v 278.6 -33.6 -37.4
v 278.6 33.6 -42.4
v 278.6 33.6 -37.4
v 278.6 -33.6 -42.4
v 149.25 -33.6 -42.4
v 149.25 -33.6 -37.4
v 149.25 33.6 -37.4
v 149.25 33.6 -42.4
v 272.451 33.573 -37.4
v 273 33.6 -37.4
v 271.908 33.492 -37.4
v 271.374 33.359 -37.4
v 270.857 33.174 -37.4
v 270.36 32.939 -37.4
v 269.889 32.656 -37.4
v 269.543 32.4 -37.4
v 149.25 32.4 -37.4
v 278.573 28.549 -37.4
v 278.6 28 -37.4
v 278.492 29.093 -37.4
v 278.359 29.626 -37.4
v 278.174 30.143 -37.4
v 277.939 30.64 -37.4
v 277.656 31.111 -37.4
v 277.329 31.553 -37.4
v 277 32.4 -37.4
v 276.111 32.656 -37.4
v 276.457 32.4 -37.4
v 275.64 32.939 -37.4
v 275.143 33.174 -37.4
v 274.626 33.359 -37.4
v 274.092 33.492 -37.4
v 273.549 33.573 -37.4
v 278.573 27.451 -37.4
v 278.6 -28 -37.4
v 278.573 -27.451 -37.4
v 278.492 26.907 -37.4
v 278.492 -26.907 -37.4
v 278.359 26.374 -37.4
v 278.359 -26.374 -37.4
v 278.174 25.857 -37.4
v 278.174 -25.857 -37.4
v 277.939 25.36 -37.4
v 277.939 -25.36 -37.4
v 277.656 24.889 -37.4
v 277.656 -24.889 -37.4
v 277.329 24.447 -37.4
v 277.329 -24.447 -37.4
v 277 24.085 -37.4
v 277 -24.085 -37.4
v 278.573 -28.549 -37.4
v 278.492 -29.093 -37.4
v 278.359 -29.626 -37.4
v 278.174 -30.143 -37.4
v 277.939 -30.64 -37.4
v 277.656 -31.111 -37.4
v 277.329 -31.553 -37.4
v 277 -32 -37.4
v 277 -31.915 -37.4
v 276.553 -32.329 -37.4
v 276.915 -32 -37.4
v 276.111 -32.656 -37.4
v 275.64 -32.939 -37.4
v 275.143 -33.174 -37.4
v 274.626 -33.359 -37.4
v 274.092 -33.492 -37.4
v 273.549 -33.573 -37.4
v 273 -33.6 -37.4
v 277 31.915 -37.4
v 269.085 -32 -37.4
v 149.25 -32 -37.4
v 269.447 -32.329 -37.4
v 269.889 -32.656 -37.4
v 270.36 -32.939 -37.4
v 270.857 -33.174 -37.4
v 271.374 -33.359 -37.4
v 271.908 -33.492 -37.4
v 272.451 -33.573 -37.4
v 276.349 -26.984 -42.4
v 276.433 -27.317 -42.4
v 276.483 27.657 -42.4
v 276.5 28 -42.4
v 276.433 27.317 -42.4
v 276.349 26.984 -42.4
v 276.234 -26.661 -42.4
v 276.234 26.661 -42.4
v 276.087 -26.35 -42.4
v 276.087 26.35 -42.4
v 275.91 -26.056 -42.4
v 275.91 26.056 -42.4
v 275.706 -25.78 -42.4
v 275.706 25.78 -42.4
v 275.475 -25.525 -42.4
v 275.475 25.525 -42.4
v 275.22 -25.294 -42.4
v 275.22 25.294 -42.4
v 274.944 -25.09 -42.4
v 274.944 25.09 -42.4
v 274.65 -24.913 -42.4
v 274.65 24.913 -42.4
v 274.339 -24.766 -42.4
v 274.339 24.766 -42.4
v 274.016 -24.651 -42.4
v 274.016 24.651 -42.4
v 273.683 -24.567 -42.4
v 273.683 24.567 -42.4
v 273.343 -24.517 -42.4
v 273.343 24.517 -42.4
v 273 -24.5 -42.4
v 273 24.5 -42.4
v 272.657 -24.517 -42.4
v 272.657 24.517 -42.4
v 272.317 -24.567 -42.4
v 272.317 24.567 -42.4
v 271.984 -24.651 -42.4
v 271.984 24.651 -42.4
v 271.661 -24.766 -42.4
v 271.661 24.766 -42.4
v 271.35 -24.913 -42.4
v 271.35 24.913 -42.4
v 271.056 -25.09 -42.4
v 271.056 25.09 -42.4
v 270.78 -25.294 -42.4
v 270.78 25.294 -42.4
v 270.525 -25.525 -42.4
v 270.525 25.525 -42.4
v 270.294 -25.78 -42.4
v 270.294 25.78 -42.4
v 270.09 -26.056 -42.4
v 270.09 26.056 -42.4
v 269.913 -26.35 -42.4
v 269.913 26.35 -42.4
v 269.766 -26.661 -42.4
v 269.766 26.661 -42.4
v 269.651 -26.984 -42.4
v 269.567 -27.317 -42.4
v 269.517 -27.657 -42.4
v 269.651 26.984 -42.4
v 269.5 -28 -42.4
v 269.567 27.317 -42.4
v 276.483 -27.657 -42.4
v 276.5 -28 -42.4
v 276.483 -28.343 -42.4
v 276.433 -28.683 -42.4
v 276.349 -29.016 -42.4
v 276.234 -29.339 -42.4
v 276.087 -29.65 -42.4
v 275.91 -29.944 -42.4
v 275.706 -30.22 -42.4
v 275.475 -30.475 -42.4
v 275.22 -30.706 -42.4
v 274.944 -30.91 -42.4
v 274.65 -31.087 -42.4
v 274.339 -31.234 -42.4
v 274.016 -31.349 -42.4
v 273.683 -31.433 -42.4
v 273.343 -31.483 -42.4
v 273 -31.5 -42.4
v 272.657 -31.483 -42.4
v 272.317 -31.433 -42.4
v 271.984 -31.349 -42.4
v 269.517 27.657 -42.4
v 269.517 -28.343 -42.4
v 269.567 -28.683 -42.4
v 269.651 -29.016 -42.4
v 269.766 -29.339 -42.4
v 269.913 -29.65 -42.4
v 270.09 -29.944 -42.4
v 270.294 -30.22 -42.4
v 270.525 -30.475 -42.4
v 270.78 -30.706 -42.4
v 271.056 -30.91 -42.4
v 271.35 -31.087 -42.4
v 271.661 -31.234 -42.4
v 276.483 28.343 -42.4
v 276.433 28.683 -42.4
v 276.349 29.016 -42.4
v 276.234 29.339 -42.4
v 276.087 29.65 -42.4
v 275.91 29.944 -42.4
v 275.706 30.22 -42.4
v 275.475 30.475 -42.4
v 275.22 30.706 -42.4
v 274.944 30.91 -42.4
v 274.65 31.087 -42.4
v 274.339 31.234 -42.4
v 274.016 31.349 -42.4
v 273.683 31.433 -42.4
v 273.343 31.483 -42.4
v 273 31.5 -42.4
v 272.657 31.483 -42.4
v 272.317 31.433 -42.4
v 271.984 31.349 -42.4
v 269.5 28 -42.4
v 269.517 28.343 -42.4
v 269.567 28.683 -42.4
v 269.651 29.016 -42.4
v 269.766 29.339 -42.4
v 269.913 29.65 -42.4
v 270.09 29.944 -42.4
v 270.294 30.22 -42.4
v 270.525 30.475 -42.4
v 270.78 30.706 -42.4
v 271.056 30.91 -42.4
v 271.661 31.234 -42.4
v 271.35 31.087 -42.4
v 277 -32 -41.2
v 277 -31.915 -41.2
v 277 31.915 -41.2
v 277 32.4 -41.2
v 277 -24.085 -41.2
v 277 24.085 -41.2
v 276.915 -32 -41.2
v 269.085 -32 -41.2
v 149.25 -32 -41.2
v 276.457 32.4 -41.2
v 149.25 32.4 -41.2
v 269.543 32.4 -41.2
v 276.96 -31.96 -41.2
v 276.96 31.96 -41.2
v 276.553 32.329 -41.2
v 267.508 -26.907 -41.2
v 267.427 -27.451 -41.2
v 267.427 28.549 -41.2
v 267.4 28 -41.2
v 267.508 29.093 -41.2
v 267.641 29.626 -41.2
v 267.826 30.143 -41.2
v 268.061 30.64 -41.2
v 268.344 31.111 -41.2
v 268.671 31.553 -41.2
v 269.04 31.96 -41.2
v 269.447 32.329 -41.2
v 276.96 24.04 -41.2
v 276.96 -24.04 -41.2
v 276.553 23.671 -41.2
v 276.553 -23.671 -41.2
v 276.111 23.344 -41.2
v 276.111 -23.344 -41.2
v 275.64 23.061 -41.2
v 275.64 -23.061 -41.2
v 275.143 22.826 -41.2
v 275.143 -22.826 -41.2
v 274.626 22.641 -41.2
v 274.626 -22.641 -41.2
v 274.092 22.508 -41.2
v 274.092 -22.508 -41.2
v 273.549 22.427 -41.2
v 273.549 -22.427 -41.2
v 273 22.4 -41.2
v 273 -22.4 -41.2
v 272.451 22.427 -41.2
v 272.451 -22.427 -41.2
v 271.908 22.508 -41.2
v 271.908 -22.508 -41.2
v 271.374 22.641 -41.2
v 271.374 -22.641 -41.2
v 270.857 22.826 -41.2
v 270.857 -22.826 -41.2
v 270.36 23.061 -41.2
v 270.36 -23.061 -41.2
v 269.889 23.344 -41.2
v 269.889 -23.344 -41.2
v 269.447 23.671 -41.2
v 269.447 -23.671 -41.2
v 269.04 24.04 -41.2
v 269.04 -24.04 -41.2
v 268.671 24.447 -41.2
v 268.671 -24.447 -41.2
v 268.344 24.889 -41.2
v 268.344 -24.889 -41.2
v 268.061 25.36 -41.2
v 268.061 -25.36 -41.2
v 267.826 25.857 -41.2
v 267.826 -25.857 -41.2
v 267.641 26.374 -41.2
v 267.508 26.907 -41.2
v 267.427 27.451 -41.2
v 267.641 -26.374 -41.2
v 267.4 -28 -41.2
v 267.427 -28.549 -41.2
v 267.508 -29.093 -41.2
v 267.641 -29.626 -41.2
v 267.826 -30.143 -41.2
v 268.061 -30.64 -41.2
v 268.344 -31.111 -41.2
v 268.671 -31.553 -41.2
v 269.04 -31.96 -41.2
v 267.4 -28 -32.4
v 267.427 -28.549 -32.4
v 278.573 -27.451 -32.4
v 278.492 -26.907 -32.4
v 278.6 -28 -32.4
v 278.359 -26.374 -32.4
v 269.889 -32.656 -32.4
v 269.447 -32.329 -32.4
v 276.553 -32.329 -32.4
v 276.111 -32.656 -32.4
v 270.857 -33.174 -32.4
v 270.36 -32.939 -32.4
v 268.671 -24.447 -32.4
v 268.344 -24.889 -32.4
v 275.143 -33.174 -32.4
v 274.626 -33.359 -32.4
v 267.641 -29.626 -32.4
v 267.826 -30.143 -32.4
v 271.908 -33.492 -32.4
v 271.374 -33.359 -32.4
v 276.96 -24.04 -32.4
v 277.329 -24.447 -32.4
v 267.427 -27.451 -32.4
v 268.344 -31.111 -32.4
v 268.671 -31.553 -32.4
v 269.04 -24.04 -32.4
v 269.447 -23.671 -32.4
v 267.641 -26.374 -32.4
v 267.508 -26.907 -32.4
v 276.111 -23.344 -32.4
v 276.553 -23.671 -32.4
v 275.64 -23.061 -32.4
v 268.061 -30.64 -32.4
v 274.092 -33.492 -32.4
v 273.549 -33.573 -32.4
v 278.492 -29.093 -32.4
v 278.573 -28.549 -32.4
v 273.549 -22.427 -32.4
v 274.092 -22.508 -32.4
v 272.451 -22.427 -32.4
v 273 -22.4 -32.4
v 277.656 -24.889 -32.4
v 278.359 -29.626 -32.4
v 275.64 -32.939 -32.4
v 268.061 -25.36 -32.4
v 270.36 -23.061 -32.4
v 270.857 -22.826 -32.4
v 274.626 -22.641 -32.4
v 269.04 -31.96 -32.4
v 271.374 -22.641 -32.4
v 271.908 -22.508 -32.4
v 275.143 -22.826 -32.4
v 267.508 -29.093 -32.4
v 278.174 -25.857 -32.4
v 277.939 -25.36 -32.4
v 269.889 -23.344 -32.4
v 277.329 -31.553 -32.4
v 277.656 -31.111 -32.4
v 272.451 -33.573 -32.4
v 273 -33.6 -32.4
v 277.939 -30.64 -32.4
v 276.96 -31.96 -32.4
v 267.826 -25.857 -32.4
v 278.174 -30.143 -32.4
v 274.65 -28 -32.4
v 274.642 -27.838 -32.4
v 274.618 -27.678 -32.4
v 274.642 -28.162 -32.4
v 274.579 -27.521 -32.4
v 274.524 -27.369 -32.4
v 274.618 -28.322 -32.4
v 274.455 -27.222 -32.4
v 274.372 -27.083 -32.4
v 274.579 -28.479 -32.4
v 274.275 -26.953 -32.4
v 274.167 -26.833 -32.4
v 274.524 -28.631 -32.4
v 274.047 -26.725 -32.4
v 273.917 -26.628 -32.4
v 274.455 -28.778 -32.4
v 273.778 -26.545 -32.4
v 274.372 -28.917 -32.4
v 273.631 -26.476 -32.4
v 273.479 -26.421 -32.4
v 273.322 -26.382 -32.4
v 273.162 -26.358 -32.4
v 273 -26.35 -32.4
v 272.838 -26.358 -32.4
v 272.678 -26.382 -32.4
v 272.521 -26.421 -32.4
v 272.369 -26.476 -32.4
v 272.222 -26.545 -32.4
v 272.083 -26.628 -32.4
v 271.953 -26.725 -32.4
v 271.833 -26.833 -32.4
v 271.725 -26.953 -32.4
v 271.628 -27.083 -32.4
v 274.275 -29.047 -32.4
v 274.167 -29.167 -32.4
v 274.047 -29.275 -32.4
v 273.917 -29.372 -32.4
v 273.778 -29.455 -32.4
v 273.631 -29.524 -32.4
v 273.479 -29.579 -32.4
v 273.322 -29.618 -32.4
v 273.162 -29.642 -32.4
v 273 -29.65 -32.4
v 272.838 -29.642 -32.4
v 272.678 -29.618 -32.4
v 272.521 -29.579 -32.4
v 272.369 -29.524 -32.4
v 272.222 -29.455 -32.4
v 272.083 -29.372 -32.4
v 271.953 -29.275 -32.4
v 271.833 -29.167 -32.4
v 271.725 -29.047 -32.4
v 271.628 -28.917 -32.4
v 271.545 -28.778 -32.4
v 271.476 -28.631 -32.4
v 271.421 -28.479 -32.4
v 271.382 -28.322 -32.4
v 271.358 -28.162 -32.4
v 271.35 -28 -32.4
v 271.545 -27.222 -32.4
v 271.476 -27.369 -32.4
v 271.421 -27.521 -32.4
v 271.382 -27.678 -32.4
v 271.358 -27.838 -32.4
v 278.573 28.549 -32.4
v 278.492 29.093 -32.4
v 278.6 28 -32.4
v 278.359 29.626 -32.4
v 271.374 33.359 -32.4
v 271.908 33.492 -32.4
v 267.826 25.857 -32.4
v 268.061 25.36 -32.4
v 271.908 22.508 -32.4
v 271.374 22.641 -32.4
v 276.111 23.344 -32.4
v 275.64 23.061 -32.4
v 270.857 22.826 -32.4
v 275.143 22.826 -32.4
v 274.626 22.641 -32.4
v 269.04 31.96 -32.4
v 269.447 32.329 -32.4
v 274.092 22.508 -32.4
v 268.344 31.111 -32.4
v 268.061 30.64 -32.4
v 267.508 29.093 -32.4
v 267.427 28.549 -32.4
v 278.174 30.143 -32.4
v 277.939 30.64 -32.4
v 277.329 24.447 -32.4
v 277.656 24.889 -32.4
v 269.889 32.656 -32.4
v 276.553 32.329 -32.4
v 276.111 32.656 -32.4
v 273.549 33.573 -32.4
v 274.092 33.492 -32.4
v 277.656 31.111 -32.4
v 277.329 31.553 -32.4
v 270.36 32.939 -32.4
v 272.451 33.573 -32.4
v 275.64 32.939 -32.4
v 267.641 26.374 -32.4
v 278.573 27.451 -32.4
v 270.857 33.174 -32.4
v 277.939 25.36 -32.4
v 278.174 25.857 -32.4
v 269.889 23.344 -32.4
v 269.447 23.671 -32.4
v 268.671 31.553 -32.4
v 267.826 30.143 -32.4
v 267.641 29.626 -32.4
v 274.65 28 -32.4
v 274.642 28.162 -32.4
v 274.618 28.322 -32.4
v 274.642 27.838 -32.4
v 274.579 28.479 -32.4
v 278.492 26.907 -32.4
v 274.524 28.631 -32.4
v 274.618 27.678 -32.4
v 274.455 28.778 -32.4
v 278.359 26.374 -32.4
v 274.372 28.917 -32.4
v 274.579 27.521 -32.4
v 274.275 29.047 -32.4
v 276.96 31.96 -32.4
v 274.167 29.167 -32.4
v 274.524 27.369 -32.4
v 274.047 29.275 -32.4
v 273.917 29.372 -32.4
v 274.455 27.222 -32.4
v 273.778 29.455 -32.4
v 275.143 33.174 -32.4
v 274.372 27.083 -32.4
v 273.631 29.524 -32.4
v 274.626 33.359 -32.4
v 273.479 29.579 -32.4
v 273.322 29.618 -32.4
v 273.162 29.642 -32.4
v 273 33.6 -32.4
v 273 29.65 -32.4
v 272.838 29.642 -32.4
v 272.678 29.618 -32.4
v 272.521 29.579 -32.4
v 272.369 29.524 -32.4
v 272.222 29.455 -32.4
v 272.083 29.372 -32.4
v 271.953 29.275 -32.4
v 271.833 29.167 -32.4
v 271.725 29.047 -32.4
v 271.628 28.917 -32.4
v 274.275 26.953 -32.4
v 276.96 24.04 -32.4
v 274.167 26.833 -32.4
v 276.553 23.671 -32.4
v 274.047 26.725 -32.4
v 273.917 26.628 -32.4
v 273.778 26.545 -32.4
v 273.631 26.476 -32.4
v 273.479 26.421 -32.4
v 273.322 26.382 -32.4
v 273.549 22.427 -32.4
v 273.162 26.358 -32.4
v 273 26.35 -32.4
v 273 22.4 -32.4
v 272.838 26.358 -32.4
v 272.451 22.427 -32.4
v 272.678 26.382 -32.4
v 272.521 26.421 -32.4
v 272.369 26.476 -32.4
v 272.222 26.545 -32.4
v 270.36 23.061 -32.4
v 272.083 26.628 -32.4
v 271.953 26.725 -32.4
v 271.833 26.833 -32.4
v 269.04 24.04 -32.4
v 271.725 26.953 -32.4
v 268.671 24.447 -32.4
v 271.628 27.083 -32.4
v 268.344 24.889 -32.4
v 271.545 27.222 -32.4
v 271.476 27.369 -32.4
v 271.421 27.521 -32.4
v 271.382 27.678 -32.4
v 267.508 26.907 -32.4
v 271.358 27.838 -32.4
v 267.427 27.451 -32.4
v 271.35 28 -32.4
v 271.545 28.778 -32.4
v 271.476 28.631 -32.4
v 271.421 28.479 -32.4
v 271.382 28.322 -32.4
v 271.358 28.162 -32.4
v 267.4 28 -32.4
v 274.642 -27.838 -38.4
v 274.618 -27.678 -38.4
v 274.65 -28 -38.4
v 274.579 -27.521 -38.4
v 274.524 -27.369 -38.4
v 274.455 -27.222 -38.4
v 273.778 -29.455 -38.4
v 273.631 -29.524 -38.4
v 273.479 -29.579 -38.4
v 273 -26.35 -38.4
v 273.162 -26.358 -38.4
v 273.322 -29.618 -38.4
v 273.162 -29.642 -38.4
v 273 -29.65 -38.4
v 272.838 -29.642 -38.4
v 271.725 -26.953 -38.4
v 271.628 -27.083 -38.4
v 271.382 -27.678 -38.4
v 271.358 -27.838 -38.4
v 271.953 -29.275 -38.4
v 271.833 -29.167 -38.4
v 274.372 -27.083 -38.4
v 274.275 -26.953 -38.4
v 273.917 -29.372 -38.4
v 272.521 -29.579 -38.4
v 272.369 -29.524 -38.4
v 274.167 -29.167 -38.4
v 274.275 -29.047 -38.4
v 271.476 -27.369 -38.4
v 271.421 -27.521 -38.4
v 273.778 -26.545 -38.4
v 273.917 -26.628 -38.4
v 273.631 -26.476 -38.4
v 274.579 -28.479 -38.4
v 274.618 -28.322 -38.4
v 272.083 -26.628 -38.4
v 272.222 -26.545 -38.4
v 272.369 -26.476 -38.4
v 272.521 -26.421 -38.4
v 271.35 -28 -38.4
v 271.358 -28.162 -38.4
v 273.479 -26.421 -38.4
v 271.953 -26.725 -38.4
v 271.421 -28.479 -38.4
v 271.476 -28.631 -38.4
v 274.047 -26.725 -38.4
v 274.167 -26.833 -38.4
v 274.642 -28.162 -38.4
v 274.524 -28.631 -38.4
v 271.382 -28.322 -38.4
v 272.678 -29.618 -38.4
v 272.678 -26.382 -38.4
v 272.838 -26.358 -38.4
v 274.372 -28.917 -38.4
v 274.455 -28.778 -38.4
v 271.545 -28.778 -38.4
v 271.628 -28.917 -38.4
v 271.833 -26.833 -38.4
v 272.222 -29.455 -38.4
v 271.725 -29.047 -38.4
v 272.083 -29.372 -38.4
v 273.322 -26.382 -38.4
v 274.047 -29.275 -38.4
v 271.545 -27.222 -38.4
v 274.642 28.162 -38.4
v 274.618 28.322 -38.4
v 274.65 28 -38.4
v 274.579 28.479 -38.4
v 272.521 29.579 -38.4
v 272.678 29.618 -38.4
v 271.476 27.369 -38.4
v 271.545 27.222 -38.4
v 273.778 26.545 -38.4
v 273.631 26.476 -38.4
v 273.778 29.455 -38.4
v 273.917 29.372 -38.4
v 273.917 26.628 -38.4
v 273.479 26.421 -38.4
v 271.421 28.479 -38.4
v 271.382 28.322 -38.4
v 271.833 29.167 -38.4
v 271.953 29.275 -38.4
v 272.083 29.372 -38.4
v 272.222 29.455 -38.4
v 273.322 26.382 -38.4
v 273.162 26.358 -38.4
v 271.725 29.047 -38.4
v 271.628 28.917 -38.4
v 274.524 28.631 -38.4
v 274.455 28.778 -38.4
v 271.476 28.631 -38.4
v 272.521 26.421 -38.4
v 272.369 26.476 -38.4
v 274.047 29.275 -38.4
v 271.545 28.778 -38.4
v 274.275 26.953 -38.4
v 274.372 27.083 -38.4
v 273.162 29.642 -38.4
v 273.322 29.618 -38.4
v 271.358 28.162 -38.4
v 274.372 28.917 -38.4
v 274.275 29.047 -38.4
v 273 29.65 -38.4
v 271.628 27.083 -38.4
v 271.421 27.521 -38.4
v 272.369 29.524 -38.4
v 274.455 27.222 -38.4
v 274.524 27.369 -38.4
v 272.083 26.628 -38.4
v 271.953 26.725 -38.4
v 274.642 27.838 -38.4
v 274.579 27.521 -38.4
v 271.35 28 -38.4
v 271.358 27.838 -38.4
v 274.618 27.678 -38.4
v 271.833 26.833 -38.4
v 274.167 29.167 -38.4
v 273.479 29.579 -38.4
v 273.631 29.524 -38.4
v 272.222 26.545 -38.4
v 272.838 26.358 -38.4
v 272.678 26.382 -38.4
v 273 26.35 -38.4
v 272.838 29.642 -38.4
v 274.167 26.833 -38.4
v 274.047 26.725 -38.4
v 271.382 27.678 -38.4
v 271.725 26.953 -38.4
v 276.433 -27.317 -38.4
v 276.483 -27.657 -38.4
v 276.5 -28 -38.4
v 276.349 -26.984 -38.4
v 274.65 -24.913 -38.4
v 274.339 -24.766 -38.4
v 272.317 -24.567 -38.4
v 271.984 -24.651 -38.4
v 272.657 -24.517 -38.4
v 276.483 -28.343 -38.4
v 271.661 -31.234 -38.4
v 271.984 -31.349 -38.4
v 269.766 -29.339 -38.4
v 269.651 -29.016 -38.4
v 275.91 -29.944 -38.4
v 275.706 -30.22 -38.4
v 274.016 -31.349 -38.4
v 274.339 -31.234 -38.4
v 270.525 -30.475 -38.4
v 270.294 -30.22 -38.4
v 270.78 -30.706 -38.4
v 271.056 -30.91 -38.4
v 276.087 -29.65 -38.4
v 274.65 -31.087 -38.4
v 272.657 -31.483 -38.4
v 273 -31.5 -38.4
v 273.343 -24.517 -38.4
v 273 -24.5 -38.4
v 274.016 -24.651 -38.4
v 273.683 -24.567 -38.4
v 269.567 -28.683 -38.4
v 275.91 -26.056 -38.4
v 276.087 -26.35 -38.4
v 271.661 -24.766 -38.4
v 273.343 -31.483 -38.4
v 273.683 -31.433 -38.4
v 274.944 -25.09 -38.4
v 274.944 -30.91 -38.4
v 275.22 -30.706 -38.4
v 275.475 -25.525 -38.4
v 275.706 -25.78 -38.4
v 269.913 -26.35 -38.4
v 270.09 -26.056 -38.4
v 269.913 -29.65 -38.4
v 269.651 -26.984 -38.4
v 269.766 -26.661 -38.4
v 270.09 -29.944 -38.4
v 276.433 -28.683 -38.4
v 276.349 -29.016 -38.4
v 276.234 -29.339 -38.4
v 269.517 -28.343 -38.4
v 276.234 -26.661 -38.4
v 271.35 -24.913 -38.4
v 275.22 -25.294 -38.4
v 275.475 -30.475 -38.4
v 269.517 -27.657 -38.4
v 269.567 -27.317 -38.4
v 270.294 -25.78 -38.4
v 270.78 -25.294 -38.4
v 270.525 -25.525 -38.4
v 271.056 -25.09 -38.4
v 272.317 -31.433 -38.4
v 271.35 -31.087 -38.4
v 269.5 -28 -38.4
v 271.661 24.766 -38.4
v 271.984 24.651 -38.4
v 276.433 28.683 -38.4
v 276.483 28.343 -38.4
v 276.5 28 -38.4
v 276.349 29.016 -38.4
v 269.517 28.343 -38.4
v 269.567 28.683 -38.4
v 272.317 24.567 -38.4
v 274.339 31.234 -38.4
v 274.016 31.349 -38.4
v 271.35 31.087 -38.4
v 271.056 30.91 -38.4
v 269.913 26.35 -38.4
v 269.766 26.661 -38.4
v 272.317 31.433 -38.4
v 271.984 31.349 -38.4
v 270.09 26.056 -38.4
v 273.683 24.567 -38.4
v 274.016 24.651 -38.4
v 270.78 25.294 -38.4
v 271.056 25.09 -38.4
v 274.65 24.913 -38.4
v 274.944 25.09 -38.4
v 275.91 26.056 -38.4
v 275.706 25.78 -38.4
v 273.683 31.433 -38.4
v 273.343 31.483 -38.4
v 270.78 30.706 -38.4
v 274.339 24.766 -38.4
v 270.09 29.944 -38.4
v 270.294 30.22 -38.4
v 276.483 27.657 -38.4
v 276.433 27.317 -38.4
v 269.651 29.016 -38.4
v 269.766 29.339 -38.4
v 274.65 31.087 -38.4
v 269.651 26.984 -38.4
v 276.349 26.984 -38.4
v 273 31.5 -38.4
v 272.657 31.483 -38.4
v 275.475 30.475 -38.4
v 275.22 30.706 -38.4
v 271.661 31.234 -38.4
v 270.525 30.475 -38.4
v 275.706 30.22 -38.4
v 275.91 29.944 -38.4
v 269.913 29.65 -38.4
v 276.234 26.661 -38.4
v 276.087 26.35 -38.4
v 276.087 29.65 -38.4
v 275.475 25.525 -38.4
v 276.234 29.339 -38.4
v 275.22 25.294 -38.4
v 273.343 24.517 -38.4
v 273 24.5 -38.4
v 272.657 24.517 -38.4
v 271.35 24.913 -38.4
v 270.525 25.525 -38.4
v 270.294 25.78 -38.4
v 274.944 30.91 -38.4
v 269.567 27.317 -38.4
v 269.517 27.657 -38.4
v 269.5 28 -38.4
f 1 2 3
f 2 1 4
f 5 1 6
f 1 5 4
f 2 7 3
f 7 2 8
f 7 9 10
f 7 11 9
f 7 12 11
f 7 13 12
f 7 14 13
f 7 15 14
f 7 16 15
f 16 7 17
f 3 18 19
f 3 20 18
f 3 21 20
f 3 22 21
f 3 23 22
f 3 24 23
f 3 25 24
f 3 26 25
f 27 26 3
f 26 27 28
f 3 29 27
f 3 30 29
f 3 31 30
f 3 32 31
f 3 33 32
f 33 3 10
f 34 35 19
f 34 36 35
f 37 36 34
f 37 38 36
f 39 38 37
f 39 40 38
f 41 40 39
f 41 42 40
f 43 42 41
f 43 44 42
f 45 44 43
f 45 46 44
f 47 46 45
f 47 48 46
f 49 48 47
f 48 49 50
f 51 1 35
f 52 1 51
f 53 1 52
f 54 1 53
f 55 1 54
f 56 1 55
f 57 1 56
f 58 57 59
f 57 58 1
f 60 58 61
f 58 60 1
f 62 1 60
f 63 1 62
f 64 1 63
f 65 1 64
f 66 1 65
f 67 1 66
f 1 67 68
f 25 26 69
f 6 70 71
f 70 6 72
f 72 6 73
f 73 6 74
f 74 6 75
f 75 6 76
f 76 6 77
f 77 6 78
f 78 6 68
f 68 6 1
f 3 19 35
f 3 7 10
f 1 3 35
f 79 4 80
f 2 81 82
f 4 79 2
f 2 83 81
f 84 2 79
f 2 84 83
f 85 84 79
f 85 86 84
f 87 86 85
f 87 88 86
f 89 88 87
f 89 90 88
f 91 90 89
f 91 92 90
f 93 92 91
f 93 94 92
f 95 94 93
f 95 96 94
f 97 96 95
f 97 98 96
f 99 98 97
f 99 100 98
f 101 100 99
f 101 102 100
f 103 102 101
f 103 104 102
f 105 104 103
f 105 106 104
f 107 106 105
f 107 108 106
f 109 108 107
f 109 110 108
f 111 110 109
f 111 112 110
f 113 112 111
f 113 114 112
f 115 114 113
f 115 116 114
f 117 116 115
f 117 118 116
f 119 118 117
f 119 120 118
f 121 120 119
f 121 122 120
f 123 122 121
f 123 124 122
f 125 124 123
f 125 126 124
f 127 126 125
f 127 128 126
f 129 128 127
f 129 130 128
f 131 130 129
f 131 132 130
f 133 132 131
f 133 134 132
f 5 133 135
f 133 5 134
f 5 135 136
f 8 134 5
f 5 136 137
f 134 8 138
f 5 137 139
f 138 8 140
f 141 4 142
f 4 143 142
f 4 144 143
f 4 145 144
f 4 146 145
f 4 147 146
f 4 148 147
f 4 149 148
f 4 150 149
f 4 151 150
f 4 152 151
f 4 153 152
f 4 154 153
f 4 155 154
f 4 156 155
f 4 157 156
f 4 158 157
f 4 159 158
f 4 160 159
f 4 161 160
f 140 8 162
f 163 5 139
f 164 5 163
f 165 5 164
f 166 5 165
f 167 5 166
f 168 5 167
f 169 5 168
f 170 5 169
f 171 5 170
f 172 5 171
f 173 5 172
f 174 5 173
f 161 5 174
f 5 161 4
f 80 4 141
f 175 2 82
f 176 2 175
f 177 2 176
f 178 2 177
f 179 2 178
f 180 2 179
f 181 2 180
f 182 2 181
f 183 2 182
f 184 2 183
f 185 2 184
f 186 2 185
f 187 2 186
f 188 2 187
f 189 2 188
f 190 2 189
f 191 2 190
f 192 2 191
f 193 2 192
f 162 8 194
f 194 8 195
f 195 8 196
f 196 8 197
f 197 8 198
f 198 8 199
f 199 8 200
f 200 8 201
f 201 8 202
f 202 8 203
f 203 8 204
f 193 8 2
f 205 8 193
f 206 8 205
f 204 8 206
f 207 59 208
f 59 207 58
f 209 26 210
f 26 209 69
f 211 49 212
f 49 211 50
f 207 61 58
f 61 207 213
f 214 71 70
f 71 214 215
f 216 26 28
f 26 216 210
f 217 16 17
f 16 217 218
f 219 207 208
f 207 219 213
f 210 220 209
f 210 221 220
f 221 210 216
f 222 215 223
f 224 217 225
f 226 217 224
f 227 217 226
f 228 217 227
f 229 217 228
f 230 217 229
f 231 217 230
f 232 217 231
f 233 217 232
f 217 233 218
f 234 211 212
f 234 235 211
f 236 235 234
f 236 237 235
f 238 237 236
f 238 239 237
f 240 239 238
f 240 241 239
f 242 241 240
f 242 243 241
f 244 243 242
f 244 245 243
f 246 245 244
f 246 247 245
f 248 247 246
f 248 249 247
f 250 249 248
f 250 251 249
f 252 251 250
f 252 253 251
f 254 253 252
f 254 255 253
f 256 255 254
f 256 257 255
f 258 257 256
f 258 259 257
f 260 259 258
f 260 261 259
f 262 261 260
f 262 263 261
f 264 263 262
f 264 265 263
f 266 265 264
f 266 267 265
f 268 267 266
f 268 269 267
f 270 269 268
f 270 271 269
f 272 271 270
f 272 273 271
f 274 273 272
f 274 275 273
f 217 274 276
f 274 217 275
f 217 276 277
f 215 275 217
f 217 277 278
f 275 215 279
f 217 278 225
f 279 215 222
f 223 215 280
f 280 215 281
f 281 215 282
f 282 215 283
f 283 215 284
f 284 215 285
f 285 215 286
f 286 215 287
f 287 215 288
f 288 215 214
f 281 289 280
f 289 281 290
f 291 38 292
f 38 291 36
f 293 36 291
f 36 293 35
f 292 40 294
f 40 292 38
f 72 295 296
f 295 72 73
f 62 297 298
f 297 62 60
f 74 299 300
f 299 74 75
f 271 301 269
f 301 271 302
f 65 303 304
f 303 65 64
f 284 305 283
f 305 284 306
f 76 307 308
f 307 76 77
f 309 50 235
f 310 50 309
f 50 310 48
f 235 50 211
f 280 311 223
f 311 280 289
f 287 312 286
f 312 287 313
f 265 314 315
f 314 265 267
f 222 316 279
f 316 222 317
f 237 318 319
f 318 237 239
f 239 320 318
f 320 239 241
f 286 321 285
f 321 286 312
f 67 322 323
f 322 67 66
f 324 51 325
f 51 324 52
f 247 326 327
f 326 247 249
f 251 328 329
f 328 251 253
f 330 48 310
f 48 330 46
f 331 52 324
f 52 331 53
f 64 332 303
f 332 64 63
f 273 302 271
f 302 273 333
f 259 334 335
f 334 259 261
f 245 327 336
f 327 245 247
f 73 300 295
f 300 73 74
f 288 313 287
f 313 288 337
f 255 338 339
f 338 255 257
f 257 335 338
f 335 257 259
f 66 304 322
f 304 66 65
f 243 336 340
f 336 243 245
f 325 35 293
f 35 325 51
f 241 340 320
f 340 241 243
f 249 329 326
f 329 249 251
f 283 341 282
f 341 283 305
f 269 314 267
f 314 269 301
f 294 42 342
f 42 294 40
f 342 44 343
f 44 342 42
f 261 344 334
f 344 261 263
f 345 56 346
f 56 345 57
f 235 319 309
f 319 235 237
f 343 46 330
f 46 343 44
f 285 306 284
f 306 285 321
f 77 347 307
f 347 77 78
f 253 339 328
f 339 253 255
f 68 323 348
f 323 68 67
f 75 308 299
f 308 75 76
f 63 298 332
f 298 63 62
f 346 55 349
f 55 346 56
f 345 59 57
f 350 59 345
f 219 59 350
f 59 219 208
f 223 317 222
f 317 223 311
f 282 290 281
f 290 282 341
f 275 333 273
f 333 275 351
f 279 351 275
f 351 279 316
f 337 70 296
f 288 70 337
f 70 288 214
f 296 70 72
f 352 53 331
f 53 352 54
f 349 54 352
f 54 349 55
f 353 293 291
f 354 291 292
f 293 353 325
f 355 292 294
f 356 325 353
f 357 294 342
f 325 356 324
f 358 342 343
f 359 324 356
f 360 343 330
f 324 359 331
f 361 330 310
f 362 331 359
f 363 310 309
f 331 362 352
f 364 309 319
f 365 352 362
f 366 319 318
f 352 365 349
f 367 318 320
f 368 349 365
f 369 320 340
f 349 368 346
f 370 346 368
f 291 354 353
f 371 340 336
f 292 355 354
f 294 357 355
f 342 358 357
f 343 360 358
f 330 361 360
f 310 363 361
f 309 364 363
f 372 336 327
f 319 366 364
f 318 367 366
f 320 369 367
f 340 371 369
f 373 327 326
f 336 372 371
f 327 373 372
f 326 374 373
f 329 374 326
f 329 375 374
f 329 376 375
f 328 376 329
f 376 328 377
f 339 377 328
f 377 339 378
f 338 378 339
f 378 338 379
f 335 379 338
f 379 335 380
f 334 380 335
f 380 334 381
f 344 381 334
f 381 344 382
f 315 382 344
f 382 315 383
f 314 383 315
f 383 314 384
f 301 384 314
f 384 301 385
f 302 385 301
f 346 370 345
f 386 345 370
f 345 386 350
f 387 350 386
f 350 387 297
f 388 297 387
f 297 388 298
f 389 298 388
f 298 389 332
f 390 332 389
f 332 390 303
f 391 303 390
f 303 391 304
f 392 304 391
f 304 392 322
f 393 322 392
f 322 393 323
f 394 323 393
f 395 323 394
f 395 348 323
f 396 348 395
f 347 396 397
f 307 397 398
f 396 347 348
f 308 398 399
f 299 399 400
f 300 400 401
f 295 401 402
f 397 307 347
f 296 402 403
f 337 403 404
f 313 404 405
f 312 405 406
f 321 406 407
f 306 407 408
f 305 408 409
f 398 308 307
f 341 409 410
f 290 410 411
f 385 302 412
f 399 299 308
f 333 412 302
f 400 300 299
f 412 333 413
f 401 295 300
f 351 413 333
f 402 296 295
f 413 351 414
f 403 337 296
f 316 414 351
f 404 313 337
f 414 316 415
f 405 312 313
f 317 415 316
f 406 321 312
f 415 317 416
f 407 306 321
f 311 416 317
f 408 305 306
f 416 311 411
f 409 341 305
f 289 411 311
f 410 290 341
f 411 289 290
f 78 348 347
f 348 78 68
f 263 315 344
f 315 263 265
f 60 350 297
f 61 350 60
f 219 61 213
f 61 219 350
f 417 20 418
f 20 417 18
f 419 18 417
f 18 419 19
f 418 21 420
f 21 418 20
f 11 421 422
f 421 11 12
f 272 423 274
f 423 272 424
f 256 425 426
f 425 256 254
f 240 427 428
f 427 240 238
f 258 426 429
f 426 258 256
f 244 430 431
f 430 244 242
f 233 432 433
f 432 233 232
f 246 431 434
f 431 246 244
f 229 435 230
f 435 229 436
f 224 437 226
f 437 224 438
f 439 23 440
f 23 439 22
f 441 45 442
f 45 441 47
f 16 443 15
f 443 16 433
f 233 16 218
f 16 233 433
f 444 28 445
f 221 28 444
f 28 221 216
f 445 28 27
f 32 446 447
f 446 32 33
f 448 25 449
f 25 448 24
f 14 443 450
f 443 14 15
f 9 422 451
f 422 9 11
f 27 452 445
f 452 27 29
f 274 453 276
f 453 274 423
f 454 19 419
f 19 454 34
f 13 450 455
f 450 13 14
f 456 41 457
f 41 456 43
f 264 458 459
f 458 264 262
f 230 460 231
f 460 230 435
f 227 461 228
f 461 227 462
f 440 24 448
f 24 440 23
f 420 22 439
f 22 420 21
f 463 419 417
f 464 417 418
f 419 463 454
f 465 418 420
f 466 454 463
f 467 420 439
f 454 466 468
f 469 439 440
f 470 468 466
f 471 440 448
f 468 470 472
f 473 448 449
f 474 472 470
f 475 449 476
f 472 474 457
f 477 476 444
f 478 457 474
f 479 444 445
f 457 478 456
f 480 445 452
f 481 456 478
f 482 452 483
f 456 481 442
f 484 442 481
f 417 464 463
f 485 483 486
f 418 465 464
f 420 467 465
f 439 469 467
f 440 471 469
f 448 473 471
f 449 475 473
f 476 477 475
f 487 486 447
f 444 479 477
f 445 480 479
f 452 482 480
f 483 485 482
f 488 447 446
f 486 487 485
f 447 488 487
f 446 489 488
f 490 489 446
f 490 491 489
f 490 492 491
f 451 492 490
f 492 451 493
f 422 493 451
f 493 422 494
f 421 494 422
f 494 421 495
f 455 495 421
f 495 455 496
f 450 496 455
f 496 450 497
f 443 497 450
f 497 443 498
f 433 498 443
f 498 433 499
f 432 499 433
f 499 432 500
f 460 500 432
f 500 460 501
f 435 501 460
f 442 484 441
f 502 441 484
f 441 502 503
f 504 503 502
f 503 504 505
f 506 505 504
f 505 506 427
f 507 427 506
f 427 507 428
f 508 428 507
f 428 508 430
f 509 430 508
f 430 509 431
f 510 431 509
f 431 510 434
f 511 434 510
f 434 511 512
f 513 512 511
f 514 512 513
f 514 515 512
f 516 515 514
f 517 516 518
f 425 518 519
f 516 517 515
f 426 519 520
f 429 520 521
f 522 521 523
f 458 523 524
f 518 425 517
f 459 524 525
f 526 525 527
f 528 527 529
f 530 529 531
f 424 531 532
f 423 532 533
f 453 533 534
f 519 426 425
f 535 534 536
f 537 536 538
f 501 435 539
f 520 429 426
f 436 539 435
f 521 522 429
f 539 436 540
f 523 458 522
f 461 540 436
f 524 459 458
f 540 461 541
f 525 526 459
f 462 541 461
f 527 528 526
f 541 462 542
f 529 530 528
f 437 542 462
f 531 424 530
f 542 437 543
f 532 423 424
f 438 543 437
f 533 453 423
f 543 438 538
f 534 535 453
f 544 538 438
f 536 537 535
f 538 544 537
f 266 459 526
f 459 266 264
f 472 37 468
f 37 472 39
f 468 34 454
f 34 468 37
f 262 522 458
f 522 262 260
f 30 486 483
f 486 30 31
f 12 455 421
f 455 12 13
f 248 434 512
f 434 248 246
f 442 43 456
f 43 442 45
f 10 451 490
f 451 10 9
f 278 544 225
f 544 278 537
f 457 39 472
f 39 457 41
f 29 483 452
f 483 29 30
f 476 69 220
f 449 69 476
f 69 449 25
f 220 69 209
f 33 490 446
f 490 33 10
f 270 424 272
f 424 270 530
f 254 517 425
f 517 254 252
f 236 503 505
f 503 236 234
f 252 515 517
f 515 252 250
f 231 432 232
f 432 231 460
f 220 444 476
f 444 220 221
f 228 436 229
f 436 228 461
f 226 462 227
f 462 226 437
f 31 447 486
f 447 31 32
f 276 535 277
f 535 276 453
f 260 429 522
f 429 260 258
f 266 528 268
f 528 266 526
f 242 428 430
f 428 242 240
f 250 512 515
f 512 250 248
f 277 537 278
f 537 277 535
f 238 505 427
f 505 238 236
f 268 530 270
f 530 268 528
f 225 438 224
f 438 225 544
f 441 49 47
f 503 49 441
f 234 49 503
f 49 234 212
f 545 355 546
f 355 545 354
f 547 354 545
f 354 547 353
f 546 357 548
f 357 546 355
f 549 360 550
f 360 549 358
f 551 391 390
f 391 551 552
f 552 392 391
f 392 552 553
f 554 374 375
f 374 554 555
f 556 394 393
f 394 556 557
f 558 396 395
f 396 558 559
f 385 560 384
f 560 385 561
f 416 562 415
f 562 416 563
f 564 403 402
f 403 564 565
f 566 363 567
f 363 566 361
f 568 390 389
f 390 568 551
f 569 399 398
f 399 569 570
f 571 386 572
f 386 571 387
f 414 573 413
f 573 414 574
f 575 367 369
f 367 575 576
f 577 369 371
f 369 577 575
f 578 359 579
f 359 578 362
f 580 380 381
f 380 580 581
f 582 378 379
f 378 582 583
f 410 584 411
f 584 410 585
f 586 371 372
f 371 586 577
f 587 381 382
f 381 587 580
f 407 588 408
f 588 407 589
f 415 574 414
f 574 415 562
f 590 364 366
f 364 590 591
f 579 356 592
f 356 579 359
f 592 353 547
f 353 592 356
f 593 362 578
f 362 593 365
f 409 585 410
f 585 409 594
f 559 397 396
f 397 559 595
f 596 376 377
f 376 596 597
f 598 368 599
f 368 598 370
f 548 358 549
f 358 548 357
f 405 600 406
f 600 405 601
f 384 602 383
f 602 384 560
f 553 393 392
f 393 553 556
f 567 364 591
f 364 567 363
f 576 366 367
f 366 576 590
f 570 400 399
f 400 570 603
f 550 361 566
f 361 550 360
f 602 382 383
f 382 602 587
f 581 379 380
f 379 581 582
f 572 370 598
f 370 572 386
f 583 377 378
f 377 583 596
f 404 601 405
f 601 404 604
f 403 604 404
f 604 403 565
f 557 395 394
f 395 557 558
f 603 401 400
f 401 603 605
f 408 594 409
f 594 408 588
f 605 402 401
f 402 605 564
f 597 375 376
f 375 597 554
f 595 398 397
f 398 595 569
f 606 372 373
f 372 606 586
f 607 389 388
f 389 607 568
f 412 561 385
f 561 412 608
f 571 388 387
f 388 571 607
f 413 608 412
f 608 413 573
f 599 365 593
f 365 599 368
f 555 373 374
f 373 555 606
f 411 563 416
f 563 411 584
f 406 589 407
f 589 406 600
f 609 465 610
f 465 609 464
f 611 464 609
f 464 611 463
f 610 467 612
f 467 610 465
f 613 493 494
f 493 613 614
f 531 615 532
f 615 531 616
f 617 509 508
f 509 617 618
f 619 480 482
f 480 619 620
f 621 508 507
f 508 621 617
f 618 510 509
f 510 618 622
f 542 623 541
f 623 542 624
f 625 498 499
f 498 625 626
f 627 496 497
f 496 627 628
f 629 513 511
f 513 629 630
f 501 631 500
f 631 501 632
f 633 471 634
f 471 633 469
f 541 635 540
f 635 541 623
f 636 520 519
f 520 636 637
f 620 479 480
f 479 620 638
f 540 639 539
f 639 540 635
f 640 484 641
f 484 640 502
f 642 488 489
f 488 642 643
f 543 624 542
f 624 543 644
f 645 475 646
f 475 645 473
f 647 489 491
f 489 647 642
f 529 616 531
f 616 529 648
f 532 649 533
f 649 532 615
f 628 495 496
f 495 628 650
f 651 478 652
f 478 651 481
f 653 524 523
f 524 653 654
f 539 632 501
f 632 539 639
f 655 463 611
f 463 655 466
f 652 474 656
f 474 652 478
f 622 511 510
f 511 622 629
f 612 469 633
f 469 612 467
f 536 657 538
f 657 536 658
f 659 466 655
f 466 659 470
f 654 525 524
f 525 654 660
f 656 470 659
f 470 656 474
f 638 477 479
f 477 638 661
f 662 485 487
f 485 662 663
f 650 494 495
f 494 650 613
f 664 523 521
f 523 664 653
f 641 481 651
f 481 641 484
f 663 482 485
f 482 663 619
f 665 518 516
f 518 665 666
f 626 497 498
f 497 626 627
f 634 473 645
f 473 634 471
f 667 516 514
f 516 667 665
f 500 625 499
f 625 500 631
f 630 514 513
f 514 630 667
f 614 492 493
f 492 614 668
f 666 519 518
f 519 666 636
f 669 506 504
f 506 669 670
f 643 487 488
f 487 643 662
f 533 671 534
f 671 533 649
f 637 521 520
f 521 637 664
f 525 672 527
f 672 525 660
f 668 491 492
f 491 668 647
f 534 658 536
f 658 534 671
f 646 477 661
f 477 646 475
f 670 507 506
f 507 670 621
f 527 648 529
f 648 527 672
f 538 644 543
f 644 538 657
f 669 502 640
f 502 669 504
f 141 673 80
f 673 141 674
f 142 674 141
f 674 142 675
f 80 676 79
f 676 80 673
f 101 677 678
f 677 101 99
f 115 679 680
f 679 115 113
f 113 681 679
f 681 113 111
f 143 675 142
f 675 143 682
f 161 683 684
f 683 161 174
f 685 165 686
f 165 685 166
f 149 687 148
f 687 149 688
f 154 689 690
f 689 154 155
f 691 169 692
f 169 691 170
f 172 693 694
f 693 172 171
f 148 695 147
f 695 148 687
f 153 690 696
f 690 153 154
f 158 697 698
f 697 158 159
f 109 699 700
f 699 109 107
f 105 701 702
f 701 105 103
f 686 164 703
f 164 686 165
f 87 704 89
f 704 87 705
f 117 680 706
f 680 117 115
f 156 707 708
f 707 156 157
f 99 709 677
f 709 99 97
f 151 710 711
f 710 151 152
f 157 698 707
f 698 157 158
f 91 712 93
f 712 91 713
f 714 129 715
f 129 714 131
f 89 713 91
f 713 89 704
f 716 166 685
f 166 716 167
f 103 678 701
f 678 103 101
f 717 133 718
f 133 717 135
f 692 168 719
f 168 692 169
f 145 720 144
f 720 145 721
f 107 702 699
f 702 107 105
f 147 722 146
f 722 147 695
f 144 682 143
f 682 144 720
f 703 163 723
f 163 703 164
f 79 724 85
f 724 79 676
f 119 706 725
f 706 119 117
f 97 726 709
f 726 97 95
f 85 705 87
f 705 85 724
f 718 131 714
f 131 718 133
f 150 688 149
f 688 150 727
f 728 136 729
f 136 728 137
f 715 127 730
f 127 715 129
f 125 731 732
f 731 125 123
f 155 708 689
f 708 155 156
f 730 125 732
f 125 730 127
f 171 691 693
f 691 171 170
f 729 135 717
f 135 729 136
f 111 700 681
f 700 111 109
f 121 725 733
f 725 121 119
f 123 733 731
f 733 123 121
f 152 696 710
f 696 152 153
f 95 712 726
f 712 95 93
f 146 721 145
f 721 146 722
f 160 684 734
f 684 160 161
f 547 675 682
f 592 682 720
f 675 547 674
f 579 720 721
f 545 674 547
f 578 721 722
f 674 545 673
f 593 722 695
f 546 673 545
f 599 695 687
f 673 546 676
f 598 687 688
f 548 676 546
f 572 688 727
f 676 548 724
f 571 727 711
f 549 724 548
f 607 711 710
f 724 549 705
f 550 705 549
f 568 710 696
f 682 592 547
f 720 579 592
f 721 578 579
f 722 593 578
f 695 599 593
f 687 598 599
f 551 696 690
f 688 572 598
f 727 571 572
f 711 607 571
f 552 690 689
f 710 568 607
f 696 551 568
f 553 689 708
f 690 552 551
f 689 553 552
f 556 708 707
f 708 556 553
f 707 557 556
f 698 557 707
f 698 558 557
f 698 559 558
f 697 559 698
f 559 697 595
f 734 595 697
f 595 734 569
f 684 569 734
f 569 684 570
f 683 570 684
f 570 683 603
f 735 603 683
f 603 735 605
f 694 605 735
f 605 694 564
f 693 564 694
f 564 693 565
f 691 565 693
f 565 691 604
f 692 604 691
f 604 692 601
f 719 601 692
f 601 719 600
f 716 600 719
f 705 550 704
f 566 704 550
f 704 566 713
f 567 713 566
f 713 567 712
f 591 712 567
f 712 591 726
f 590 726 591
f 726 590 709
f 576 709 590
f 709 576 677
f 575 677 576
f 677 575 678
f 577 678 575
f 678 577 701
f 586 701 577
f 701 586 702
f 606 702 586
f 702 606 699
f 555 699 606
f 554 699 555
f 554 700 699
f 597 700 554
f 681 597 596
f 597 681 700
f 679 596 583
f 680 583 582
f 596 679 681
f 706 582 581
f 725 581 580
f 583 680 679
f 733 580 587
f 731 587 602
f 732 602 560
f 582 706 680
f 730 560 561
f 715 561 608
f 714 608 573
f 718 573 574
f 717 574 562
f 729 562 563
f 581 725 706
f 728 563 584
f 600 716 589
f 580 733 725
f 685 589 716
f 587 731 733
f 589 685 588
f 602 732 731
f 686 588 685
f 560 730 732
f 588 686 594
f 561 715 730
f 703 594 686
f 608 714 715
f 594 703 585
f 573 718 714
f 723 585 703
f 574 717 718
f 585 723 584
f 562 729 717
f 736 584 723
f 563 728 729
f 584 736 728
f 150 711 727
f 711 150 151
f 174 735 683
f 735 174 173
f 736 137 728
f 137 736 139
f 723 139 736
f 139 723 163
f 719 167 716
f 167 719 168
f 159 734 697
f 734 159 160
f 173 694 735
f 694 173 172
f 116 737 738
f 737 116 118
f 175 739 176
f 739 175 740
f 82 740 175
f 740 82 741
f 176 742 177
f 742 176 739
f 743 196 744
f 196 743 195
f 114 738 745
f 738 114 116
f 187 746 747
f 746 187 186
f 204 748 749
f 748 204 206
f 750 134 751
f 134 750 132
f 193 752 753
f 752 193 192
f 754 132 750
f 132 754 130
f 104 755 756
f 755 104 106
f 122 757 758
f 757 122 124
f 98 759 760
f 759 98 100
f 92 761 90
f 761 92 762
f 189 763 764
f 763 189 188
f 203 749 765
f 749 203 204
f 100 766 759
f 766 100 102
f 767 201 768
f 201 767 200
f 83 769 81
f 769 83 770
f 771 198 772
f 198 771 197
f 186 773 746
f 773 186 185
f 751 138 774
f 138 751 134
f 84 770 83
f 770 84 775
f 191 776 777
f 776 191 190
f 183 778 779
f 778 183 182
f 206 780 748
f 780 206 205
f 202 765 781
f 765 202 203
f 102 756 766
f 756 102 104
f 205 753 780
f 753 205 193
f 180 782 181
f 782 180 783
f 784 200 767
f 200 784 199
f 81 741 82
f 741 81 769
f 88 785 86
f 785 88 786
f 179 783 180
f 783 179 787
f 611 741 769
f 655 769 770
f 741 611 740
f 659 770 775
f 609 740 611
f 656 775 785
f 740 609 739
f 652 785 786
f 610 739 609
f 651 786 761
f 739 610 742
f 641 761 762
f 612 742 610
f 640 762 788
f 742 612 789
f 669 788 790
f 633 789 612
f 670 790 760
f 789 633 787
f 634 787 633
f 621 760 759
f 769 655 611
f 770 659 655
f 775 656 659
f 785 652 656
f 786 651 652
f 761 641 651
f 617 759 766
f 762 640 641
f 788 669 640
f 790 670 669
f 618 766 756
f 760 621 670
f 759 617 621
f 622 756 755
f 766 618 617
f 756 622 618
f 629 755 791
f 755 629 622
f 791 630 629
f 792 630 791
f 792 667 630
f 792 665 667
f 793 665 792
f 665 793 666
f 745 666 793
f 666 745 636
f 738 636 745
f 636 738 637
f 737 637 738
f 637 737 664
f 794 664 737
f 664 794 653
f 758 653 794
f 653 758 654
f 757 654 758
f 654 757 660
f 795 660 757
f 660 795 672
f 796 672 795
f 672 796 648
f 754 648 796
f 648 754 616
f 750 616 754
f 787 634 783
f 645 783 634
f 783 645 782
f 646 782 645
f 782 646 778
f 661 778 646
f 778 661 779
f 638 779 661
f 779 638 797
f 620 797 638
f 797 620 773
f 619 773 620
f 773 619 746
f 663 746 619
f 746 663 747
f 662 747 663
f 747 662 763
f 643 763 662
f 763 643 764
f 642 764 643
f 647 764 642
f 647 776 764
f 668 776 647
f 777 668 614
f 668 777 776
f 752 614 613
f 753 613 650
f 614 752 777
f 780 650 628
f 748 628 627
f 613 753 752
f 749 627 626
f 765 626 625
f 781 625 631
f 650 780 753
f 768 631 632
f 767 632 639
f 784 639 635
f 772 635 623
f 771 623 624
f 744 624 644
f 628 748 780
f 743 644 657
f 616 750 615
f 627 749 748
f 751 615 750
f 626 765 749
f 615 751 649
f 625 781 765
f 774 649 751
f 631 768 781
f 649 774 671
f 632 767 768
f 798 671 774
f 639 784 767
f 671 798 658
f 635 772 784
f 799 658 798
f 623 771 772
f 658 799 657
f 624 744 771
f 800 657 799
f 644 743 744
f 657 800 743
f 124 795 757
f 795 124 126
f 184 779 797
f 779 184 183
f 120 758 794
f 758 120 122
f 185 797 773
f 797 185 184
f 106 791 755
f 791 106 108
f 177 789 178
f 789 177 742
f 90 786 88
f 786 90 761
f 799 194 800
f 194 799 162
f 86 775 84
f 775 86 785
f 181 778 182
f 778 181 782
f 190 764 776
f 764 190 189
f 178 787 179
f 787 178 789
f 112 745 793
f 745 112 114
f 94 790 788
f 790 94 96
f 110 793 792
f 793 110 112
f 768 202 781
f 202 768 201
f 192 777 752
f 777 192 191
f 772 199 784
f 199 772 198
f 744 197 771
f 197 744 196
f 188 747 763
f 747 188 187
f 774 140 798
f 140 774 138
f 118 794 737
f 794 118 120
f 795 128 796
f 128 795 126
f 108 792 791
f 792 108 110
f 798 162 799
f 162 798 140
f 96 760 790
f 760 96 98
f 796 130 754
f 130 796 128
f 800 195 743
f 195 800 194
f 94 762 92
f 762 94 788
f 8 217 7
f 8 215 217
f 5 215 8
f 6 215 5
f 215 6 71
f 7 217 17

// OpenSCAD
// file: 7segment.scad
module sevenSegment
(
  tilt = 5,
  corner = 8,
  sizeY = 80,
  sizeX = 46,
  width = 12,
  barrier = 1.7,
  heigth = 16,
  gaps = true,
)
{
  module hd_lb(d=barrier)
  {
    translate([barrier/2+sin(tilt)*(width-corner)+width-corner,width-corner+barrier/2,-1]) cylinder(d=d, h=heigth+2);
  }
  module hd_lh(d=barrier)
  {
    translate([barrier/2+sin(tilt)*(width-corner+(sizeY-3*width)/2)+width-corner,width-corner+(sizeY-3*width)/2-barrier/2,-1]) cylinder(d=d, h=heigth+2); 
  }
  module hd_rh(d=barrier)
  {
    translate([sin(tilt)*(width-corner+(sizeY-3*width)/2)+sizeX-corner-width-barrier/2,width-corner+(sizeY-3*width)/2-barrier/2,-1]) cylinder(d=d, h=heigth+2);
  }
  module hd_rb(d=barrier)
  {
    translate([sin(tilt)*(width-corner)+sizeX-corner-width-barrier/2,width-corner+barrier/2,-1]) cylinder(d=d, h=heigth+2);
  }
  module hh_lb(d=barrier)
  {
    translate([sin(tilt)*(2*width-corner+(sizeY-3*width)/2)+width-corner+barrier/2,2*width-corner+(sizeY-3*width)/2+barrier/2,-1]) cylinder(d=d, h=heigth+2);
  }
  module hh_lh(d=barrier)
  {
    translate([sin(tilt)*(sizeY-corner-width)+width-corner+barrier/2,sizeY-corner-width-barrier/2,-1]) cylinder(d=d, h=heigth+2);
  }
  module hh_rh(d=barrier)
  {
    translate([sin(tilt)*(sizeY-corner-width)+sizeX-corner-width-barrier/2,sizeY-corner-width-barrier/2,-1]) cylinder(d=d, h=heigth+2);
  }
  module hh_rb(d=barrier)
  {
    translate([sin(tilt)*(2*width-corner+(sizeY-3*width)/2)+sizeX-corner-width-barrier/2,2*width-corner+(sizeY-3*width)/2+barrier/2,-1]) cylinder(d=d, h=heigth+2);
  }
  module l_md(d=barrier)
  {
    translate([sin(tilt)*(sizeY/2-corner)+width/3-corner,sizeY/2-corner,-1]) cylinder(d=d, h=heigth+2);
  }
  module r_md(d=barrier)
  {
    translate([sin(tilt)*(sizeY/2-corner)+sizeX-width/3-corner,sizeY/2-corner,-1]) cylinder(d=d, h=heigth+2);
  }

  translate([corner,corner,0])
  {
    difference()
    {
      hull()
      {
        cylinder(r=corner, h=heigth);
        translate([(sizeY-2*corner)*sin(tilt),sizeY-2*corner,0]) cylinder(r=corner, h=heigth);
        translate([(sizeX-2*corner)+(sizeY-2*corner)*sin(tilt),sizeY-2*corner,0]) cylinder(r=corner, h=heigth);
        translate([(sizeX-2*corner),0,0]) cylinder(r=corner, h=heigth);
      }
      hull() { hd_lb(); hd_lh(); hd_rh(); hd_rb(); }
      hull() { hh_lb(); hh_lh(); hh_rh(); hh_rb(); }
      
      if (gaps)
      {
        hull() { hd_lb(); translate([-2*width,-2*width,0]) hd_lb(); }
        hull() { hd_rb(); translate([2*width,-2*width,0]) hd_rb(); }
        hull() { hh_lh(); translate([-2*width,2*width,0]) hh_lh(); }
        hull() { hh_rh(); translate([2*width,2*width,0]) hh_rh(); }

        hull() { hh_lb(); l_md(); }
        hull() { hd_lh(); l_md(); }
        hull() { l_md(); translate([-width*1.5,0,0]) l_md(d=barrier); }
        hull() { hh_rb(); r_md(); }
        hull() { hd_rh(); r_md(); }
        hull() { r_md(); translate([width*1.5,0,0]) r_md(d=barrier); }
      }
    }
  }
}



/*
 *
 * demo code
 * 
 */

translate([-120,0,0]) sevenSegment(sizeY = 80*2, sizeX = 46*2, width = 24);

//color ("black") 

color("lightgrey") translate([(3+1)/2,(3+1)/2,0.01])  sevenSegment(
    tilt = 5,
    corner = 8-(3+1)/2,
    sizeY = 100-3-1,
    sizeX = 55-3-1,
    width = 14-3-1,
    barrier = 1.7+1,
    heigth = 15,
    gaps = true
  );

color ("black") 

translate([70,0,0]) difference()
{
  sevenSegment( sizeY = 100, sizeX = 55, width = 14, heigth = 5,gaps = false);
  translate([3/2,3/2,-1])
  sevenSegment(
    tilt = 5,
    corner = 8-3/2,
    sizeY = 100-3,
    sizeX = 55-3,
    width = 14-3,
    barrier = 1.7,
    heigth = 5+2,
    gaps = true
  );
}

translate([70,0,80]) color("lightgrey") translate([(3+1)/2,(3+1)/2,0.01])  sevenSegment(
    tilt = 5,
    corner = 8-(3+1)/2,
    sizeY = 100-3-1,
    sizeX = 55-3-1,
    width = 14-3-1,
    barrier = 1.7+1,
    heigth = 15,
    gaps = true
  );



//translate([140,0,0]) sevenSegment();
translate([140,0,0]) sevenSegment(sizeY = 80*0.6, sizeX = 46*0.6, width = 8, tilt = 0);
translate([175,0,0]) sevenSegment(sizeY = 80*0.6, sizeX = 46*0.6, width = 8, tilt = 10);
translate([210,0,0]) sevenSegment(sizeY = 80*0.6, sizeX = 46*0.6, width = 8, tilt = 20);
translate([245,0,0]) sevenSegment(sizeY = 80*0.6, sizeX = 46*0.6, width = 8, tilt = 30);

translate([300,0,0]) difference()
{
  sevenSegment( sizeY = 100, sizeX = 55, width = 14, gaps = false);
  translate([4/2,4/2,-1])
  sevenSegment(
    tilt = 5,
    corner = 8-4/2,
    sizeY = 100-4,
    sizeX = 55-4,
    width = 14-4,
    barrier = 1.7,
    heigth = 16+2,
    gaps = true
  );
  translate([3/2,3/2,16-2])
  sevenSegment(
    tilt = 5,
    corner = 8-3/2,
    sizeY = 100-3,
    sizeX = 55-3,
    width = 14-3,
    barrier = 1.7-(4-3),
    heigth = 3,
    gaps = true
  );
}
// main file
$fn = 64;
use <clock.scad>
rotate ([90,0,0]) 
  cover_2of_3();
